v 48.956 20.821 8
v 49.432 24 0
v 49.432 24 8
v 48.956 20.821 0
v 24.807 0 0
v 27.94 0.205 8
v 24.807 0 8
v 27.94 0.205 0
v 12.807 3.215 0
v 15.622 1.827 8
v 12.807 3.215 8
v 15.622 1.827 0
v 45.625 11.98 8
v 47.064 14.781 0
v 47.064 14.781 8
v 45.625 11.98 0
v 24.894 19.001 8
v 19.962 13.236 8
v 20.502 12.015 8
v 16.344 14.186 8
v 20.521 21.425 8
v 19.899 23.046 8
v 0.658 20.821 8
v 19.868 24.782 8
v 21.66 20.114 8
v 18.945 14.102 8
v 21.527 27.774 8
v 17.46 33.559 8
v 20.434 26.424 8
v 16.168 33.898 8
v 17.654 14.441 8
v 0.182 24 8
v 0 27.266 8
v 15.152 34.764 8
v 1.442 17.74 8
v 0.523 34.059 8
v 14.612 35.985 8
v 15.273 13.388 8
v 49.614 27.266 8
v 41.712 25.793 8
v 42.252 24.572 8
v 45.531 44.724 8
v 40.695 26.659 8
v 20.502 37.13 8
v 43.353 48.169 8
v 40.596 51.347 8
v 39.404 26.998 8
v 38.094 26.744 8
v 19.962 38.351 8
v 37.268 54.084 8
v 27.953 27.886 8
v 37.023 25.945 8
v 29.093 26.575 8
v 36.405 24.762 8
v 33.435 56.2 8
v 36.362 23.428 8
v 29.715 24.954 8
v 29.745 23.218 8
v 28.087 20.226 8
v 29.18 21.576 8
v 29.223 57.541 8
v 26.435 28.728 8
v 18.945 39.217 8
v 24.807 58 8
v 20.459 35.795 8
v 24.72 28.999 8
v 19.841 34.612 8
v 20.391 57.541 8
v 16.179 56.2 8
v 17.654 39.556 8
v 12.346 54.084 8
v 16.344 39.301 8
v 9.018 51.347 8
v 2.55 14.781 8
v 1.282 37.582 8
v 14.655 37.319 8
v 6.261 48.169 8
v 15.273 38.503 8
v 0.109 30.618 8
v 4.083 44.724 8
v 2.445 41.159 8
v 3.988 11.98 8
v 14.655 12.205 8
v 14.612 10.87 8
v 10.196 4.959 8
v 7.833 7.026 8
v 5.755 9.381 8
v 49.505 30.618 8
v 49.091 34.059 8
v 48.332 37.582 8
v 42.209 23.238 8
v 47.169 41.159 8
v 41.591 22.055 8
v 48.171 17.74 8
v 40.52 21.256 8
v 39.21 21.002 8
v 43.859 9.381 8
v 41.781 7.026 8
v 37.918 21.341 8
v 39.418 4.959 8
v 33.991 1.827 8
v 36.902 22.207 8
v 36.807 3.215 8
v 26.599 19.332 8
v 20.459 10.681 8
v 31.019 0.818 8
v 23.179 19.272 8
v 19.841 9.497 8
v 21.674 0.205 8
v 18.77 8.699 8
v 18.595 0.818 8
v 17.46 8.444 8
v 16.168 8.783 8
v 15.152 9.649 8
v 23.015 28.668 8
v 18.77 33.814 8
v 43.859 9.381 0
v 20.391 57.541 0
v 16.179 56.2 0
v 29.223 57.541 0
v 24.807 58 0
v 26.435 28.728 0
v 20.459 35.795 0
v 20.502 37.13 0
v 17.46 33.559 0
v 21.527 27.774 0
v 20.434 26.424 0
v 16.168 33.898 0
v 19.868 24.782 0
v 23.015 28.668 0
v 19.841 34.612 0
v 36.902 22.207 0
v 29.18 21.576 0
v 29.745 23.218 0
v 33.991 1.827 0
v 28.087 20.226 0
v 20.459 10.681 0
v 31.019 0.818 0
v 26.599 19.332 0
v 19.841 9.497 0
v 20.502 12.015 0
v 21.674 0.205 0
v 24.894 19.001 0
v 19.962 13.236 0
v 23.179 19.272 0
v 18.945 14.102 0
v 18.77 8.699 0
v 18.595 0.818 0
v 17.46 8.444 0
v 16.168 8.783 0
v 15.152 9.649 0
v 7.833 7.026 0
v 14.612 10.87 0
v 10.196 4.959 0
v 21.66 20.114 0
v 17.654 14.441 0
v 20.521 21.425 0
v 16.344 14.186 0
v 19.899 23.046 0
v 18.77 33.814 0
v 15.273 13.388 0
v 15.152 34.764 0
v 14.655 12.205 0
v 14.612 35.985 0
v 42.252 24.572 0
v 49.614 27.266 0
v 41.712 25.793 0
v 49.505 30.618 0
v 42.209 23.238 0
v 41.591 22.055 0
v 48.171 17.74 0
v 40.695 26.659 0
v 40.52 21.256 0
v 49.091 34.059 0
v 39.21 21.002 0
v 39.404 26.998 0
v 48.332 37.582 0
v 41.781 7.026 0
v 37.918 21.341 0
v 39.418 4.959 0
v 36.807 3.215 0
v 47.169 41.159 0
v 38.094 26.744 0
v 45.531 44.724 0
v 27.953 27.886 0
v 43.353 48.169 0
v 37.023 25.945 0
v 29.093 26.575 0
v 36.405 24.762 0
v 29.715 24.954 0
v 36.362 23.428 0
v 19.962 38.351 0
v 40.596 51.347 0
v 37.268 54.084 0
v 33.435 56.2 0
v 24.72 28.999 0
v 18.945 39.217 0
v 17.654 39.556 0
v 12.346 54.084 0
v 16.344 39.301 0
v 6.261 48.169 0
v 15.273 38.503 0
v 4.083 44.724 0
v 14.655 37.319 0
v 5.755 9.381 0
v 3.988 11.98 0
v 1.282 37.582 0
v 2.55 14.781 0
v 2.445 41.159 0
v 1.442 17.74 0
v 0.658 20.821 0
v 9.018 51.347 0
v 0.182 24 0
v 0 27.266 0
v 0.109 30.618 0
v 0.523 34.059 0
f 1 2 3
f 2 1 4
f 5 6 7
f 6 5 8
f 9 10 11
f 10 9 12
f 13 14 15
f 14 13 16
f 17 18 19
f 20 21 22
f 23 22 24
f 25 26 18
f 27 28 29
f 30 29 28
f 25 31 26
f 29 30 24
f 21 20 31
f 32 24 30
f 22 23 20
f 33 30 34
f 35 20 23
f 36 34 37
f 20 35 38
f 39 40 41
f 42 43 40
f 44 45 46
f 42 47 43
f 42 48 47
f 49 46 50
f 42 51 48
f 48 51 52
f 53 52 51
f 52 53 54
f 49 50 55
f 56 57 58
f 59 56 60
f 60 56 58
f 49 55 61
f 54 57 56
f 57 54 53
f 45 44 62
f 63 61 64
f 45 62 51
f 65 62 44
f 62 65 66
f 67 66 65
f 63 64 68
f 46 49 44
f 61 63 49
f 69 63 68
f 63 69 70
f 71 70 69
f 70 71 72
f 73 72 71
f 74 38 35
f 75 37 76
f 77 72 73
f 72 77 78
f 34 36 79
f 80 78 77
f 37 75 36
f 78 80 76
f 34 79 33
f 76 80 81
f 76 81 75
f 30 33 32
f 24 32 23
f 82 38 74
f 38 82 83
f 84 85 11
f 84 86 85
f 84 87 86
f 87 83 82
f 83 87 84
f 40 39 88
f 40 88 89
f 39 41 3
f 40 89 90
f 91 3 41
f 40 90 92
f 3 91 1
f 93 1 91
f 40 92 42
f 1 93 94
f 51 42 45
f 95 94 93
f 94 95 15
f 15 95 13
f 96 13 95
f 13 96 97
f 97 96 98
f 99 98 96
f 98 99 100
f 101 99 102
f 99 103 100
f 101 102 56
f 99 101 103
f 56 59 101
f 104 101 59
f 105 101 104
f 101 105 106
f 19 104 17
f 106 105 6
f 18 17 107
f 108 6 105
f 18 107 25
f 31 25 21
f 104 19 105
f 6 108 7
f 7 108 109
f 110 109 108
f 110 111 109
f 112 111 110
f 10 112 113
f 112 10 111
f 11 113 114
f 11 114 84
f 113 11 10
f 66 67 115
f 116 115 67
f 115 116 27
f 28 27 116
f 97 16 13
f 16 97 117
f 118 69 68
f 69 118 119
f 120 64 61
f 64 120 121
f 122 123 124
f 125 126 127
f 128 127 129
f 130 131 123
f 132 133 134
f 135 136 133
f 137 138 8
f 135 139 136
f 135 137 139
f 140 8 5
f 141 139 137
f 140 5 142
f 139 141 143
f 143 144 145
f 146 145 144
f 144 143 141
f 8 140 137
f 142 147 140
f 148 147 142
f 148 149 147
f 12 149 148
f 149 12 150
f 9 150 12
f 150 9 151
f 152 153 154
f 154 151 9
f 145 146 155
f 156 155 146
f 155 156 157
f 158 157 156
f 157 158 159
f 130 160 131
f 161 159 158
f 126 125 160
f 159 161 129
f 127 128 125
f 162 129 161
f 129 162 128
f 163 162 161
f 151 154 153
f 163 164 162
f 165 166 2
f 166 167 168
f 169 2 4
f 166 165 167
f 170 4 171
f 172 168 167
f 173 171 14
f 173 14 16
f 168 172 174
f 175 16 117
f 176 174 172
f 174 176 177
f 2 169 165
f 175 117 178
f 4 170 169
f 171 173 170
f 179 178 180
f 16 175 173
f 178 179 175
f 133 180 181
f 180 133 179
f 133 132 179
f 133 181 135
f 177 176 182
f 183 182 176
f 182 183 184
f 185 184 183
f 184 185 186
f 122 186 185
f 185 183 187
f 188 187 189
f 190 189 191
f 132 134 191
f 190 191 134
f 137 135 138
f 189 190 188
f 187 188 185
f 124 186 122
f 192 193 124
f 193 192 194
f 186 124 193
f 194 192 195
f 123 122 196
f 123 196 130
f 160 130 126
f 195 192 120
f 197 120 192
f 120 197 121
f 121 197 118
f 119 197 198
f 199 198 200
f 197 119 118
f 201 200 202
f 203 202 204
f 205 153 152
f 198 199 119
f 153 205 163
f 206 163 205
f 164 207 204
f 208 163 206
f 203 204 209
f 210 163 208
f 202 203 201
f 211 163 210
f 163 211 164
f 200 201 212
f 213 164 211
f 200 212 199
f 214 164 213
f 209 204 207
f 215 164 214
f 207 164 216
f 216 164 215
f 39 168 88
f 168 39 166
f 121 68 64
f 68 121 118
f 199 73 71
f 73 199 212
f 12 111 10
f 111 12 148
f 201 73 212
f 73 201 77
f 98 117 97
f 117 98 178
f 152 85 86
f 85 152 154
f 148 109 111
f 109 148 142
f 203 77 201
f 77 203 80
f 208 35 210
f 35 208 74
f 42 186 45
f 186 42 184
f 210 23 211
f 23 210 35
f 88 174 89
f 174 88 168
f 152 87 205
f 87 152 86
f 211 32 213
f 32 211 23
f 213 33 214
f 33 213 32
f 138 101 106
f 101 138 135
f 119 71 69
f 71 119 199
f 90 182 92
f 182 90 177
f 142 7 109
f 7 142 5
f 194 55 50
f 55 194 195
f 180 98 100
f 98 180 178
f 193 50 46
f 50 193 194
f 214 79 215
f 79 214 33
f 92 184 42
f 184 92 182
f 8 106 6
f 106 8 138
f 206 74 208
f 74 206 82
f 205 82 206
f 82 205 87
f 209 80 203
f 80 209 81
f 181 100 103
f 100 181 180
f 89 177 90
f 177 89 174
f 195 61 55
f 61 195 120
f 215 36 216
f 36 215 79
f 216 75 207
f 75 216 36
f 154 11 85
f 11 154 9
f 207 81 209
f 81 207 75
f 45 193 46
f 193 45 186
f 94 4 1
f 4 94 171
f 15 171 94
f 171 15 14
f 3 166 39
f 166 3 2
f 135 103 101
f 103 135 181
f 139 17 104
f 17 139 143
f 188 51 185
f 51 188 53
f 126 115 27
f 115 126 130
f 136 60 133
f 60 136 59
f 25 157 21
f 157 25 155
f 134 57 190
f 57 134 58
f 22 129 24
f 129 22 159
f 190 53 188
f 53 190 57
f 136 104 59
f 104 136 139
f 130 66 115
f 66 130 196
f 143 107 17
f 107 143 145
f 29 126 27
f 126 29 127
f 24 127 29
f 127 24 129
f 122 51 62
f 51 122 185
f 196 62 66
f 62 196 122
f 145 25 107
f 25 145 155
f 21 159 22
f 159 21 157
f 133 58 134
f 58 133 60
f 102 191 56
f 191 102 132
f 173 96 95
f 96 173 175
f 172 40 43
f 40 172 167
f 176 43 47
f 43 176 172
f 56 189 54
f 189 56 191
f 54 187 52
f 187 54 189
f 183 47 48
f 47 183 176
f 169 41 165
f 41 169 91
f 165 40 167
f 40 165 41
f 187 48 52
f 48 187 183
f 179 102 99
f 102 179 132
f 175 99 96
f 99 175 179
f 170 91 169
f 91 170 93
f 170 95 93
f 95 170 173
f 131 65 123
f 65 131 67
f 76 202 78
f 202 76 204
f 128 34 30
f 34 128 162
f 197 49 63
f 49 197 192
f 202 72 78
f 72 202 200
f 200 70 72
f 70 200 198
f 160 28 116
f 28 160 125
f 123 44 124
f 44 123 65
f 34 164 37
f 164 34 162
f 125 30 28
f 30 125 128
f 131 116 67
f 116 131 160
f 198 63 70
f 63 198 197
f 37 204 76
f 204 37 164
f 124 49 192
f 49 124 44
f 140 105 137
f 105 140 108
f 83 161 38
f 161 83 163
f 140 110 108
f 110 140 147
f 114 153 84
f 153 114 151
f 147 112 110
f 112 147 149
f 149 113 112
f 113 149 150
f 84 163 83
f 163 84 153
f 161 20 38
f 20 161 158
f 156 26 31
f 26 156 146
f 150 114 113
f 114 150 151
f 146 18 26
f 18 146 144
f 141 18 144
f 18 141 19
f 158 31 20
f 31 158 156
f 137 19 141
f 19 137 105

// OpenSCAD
$fn = 32;

// ----------------------------------------------------------------------
// Cam plate: single_lobe cam, base R24
// ----------------------------------------------------------------------

// --- parameters (mm) ---
base_r = 24;              // base circle radius
lobe_h = 10;              // cam lobe rise
bore_r = 5;               // shaft bore radius
plate_t = 8;              // plate thickness, Z (extrusion height)
ring_r = 14.5;            // lightening ring radius
bolt_r = 3;               // lightening hole radius

profile = [[49.432, 24], [49.614, 27.266], [49.505, 30.618], [49.091, 34.059], [48.332, 37.582], [47.169, 41.159], [45.531, 44.724], [43.353, 48.169], [40.596, 51.347], [37.268, 54.084], [33.435, 56.2], [29.223, 57.541], [24.807, 58], [20.391, 57.541], [16.179, 56.2], [12.346, 54.084], [9.018, 51.347], [6.261, 48.169], [4.083, 44.724], [2.445, 41.159], [1.282, 37.582], [0.523, 34.059], [0.109, 30.618], [0, 27.266], [0.182, 24], [0.658, 20.821], [1.442, 17.74], [2.55, 14.781], [3.988, 11.98], [5.755, 9.381], [7.833, 7.026], [10.196, 4.959], [12.807, 3.215], [15.622, 1.827], [18.595, 0.818], [21.674, 0.205], [24.807, 0], [27.94, 0.205], [31.019, 0.818], [33.991, 1.827], [36.807, 3.215], [39.418, 4.959], [41.781, 7.026], [43.859, 9.381], [45.625, 11.98], [47.064, 14.781], [48.171, 17.74], [48.956, 20.821]];  // primary outline, 48 points, counter clockwise
void_1 = [[29.715, 24.954], [29.093, 26.575], [27.953, 27.886], [26.435, 28.728], [24.72, 28.999], [23.015, 28.668], [21.527, 27.774], [20.434, 26.424], [19.868, 24.782], [19.899, 23.046], [20.521, 21.425], [21.66, 20.114], [23.179, 19.272], [24.894, 19.001], [26.599, 19.332], [28.087, 20.226], [29.18, 21.576], [29.745, 23.218]];  // shaft bore, 18 points
void_2 = [[42.252, 24.572], [41.712, 25.793], [40.695, 26.659], [39.404, 26.998], [38.094, 26.744], [37.023, 25.945], [36.405, 24.762], [36.362, 23.428], [36.902, 22.207], [37.918, 21.341], [39.21, 21.002], [40.52, 21.256], [41.591, 22.055], [42.209, 23.238]];  // lightening hole 1, 14 points
void_3 = [[20.502, 37.13], [19.962, 38.351], [18.945, 39.217], [17.654, 39.556], [16.344, 39.301], [15.273, 38.503], [14.655, 37.319], [14.612, 35.985], [15.152, 34.764], [16.168, 33.898], [17.46, 33.559], [18.77, 33.814], [19.841, 34.612], [20.459, 35.795]];  // lightening hole 2, 14 points
void_4 = [[20.502, 12.015], [19.962, 13.236], [18.945, 14.102], [17.654, 14.441], [16.344, 14.186], [15.273, 13.388], [14.655, 12.205], [14.612, 10.87], [15.152, 9.649], [16.168, 8.783], [17.46, 8.444], [18.77, 8.699], [19.841, 9.497], [20.459, 10.681]];  // lightening hole 3, 14 points

// --- the one profile operation ---
difference() {
  linear_extrude(height = plate_t) polygon(points = profile);
  translate([0, 0, -1])
    linear_extrude(height = plate_t + 2) polygon(points = void_1);
  translate([0, 0, -1])
    linear_extrude(height = plate_t + 2) polygon(points = void_2);
  translate([0, 0, -1])
    linear_extrude(height = plate_t + 2) polygon(points = void_3);
  translate([0, 0, -1])
    linear_extrude(height = plate_t + 2) polygon(points = void_4);
}
